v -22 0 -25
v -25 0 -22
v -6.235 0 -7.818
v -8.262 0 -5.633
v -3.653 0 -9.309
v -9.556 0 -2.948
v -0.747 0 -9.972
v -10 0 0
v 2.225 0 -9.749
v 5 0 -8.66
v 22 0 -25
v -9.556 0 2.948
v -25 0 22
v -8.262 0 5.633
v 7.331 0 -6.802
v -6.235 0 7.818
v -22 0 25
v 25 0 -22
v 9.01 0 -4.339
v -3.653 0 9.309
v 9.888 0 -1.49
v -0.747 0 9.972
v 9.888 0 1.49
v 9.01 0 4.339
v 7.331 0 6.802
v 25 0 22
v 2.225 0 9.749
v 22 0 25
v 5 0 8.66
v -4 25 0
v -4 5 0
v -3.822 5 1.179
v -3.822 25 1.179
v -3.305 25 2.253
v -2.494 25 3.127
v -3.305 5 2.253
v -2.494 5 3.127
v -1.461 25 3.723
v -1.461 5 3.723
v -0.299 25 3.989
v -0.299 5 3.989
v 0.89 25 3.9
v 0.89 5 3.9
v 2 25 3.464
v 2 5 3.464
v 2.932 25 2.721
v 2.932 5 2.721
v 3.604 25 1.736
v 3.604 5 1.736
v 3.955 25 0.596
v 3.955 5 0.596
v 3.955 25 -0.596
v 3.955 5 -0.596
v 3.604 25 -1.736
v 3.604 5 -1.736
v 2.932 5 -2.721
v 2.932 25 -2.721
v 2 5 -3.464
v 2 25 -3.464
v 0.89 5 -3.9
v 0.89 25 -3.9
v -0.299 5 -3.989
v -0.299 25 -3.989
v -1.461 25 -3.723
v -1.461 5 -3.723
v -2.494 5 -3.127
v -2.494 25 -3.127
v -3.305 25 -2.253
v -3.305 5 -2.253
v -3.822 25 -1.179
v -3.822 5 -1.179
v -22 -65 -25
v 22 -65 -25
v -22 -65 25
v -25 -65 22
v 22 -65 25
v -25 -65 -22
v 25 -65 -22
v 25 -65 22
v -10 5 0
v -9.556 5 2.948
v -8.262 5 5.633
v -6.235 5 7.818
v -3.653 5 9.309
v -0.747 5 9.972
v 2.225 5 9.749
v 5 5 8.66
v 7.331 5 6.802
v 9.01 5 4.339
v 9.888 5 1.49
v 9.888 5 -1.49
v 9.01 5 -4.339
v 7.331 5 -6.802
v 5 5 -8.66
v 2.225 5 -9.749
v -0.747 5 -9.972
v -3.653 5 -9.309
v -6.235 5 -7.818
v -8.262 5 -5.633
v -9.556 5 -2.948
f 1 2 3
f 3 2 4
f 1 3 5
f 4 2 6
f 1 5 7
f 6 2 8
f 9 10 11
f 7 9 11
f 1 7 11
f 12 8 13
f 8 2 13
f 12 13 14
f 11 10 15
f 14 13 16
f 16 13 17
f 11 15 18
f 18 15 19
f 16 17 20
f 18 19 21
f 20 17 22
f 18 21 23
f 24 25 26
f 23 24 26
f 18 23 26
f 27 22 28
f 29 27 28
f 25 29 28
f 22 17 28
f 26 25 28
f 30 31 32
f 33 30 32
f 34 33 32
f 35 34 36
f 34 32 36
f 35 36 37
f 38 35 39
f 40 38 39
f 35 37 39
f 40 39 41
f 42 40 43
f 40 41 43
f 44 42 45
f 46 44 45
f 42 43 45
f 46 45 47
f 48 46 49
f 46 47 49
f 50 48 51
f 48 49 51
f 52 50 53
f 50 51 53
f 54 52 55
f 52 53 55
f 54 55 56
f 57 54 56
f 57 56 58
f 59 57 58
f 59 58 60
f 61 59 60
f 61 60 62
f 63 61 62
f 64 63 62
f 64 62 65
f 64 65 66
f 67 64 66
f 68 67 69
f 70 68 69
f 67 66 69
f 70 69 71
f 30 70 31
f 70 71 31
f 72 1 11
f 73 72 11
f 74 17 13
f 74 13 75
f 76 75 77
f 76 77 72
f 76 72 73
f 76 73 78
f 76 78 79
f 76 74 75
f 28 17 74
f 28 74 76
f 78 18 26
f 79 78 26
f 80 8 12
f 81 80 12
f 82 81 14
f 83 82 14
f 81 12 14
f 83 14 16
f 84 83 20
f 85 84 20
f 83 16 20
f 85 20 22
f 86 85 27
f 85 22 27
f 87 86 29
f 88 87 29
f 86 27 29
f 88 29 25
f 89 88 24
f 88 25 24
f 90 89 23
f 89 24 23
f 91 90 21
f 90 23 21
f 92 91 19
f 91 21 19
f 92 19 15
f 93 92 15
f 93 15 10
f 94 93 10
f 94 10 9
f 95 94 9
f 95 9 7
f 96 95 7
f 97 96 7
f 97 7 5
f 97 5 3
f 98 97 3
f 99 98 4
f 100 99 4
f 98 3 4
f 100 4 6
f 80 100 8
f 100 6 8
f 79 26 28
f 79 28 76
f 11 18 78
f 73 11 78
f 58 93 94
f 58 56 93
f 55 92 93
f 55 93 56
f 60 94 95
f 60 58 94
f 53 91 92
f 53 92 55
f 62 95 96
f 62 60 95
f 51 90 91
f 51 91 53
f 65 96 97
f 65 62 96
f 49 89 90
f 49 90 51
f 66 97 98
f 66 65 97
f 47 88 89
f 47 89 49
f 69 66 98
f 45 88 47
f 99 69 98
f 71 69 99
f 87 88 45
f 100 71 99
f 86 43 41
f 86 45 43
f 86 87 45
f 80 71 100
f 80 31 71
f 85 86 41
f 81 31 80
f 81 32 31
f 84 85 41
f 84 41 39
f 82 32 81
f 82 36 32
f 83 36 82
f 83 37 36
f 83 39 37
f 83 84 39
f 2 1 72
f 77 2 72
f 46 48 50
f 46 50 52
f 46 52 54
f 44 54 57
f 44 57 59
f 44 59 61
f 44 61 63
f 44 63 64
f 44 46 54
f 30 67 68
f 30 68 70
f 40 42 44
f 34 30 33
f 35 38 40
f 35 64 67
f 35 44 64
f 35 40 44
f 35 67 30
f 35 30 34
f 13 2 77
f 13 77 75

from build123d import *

# Parameters (mm, degrees)
F0_W     = 50
F0_H     = 50
F1_DEPTH = 65
F2_R     = 10
F3_DEPTH = 5
F4_R     = 4
F5_DEPTH = 20
F6_SIZE  = 3


with BuildPart() as f1:
    # F0 (on Front) → F1 (new body)
    with BuildSketch(Plane.XZ):
        Rectangle(F0_W, F0_H)
    extrude(amount=F1_DEPTH)

    # F2 (on face) → F3 (join)
    with BuildSketch(Plane(origin=(0, 0, 0), x_dir=(-1, 0, 0), z_dir=(0, 1, 0))):
        Circle(F2_R)
    extrude(amount=F3_DEPTH)

    # F4 (on face) → F5 (join)
    with BuildSketch(Plane(origin=(0, 5, 0), x_dir=(-1, 0, 0), z_dir=(0, 1, 0))):
        Circle(F4_R)
    extrude(amount=F5_DEPTH)

    # F6
    f6_edges = [f1.edges().sort_by_distance(p)[0] for p in [
        (-25, -32.5, 25),
        (-25, -32.5, -25),
        (25, -32.5, -25),
        (25, -32.5, 25),
    ]]
    chamfer(f6_edges, length=F6_SIZE)


solid = f1.part
